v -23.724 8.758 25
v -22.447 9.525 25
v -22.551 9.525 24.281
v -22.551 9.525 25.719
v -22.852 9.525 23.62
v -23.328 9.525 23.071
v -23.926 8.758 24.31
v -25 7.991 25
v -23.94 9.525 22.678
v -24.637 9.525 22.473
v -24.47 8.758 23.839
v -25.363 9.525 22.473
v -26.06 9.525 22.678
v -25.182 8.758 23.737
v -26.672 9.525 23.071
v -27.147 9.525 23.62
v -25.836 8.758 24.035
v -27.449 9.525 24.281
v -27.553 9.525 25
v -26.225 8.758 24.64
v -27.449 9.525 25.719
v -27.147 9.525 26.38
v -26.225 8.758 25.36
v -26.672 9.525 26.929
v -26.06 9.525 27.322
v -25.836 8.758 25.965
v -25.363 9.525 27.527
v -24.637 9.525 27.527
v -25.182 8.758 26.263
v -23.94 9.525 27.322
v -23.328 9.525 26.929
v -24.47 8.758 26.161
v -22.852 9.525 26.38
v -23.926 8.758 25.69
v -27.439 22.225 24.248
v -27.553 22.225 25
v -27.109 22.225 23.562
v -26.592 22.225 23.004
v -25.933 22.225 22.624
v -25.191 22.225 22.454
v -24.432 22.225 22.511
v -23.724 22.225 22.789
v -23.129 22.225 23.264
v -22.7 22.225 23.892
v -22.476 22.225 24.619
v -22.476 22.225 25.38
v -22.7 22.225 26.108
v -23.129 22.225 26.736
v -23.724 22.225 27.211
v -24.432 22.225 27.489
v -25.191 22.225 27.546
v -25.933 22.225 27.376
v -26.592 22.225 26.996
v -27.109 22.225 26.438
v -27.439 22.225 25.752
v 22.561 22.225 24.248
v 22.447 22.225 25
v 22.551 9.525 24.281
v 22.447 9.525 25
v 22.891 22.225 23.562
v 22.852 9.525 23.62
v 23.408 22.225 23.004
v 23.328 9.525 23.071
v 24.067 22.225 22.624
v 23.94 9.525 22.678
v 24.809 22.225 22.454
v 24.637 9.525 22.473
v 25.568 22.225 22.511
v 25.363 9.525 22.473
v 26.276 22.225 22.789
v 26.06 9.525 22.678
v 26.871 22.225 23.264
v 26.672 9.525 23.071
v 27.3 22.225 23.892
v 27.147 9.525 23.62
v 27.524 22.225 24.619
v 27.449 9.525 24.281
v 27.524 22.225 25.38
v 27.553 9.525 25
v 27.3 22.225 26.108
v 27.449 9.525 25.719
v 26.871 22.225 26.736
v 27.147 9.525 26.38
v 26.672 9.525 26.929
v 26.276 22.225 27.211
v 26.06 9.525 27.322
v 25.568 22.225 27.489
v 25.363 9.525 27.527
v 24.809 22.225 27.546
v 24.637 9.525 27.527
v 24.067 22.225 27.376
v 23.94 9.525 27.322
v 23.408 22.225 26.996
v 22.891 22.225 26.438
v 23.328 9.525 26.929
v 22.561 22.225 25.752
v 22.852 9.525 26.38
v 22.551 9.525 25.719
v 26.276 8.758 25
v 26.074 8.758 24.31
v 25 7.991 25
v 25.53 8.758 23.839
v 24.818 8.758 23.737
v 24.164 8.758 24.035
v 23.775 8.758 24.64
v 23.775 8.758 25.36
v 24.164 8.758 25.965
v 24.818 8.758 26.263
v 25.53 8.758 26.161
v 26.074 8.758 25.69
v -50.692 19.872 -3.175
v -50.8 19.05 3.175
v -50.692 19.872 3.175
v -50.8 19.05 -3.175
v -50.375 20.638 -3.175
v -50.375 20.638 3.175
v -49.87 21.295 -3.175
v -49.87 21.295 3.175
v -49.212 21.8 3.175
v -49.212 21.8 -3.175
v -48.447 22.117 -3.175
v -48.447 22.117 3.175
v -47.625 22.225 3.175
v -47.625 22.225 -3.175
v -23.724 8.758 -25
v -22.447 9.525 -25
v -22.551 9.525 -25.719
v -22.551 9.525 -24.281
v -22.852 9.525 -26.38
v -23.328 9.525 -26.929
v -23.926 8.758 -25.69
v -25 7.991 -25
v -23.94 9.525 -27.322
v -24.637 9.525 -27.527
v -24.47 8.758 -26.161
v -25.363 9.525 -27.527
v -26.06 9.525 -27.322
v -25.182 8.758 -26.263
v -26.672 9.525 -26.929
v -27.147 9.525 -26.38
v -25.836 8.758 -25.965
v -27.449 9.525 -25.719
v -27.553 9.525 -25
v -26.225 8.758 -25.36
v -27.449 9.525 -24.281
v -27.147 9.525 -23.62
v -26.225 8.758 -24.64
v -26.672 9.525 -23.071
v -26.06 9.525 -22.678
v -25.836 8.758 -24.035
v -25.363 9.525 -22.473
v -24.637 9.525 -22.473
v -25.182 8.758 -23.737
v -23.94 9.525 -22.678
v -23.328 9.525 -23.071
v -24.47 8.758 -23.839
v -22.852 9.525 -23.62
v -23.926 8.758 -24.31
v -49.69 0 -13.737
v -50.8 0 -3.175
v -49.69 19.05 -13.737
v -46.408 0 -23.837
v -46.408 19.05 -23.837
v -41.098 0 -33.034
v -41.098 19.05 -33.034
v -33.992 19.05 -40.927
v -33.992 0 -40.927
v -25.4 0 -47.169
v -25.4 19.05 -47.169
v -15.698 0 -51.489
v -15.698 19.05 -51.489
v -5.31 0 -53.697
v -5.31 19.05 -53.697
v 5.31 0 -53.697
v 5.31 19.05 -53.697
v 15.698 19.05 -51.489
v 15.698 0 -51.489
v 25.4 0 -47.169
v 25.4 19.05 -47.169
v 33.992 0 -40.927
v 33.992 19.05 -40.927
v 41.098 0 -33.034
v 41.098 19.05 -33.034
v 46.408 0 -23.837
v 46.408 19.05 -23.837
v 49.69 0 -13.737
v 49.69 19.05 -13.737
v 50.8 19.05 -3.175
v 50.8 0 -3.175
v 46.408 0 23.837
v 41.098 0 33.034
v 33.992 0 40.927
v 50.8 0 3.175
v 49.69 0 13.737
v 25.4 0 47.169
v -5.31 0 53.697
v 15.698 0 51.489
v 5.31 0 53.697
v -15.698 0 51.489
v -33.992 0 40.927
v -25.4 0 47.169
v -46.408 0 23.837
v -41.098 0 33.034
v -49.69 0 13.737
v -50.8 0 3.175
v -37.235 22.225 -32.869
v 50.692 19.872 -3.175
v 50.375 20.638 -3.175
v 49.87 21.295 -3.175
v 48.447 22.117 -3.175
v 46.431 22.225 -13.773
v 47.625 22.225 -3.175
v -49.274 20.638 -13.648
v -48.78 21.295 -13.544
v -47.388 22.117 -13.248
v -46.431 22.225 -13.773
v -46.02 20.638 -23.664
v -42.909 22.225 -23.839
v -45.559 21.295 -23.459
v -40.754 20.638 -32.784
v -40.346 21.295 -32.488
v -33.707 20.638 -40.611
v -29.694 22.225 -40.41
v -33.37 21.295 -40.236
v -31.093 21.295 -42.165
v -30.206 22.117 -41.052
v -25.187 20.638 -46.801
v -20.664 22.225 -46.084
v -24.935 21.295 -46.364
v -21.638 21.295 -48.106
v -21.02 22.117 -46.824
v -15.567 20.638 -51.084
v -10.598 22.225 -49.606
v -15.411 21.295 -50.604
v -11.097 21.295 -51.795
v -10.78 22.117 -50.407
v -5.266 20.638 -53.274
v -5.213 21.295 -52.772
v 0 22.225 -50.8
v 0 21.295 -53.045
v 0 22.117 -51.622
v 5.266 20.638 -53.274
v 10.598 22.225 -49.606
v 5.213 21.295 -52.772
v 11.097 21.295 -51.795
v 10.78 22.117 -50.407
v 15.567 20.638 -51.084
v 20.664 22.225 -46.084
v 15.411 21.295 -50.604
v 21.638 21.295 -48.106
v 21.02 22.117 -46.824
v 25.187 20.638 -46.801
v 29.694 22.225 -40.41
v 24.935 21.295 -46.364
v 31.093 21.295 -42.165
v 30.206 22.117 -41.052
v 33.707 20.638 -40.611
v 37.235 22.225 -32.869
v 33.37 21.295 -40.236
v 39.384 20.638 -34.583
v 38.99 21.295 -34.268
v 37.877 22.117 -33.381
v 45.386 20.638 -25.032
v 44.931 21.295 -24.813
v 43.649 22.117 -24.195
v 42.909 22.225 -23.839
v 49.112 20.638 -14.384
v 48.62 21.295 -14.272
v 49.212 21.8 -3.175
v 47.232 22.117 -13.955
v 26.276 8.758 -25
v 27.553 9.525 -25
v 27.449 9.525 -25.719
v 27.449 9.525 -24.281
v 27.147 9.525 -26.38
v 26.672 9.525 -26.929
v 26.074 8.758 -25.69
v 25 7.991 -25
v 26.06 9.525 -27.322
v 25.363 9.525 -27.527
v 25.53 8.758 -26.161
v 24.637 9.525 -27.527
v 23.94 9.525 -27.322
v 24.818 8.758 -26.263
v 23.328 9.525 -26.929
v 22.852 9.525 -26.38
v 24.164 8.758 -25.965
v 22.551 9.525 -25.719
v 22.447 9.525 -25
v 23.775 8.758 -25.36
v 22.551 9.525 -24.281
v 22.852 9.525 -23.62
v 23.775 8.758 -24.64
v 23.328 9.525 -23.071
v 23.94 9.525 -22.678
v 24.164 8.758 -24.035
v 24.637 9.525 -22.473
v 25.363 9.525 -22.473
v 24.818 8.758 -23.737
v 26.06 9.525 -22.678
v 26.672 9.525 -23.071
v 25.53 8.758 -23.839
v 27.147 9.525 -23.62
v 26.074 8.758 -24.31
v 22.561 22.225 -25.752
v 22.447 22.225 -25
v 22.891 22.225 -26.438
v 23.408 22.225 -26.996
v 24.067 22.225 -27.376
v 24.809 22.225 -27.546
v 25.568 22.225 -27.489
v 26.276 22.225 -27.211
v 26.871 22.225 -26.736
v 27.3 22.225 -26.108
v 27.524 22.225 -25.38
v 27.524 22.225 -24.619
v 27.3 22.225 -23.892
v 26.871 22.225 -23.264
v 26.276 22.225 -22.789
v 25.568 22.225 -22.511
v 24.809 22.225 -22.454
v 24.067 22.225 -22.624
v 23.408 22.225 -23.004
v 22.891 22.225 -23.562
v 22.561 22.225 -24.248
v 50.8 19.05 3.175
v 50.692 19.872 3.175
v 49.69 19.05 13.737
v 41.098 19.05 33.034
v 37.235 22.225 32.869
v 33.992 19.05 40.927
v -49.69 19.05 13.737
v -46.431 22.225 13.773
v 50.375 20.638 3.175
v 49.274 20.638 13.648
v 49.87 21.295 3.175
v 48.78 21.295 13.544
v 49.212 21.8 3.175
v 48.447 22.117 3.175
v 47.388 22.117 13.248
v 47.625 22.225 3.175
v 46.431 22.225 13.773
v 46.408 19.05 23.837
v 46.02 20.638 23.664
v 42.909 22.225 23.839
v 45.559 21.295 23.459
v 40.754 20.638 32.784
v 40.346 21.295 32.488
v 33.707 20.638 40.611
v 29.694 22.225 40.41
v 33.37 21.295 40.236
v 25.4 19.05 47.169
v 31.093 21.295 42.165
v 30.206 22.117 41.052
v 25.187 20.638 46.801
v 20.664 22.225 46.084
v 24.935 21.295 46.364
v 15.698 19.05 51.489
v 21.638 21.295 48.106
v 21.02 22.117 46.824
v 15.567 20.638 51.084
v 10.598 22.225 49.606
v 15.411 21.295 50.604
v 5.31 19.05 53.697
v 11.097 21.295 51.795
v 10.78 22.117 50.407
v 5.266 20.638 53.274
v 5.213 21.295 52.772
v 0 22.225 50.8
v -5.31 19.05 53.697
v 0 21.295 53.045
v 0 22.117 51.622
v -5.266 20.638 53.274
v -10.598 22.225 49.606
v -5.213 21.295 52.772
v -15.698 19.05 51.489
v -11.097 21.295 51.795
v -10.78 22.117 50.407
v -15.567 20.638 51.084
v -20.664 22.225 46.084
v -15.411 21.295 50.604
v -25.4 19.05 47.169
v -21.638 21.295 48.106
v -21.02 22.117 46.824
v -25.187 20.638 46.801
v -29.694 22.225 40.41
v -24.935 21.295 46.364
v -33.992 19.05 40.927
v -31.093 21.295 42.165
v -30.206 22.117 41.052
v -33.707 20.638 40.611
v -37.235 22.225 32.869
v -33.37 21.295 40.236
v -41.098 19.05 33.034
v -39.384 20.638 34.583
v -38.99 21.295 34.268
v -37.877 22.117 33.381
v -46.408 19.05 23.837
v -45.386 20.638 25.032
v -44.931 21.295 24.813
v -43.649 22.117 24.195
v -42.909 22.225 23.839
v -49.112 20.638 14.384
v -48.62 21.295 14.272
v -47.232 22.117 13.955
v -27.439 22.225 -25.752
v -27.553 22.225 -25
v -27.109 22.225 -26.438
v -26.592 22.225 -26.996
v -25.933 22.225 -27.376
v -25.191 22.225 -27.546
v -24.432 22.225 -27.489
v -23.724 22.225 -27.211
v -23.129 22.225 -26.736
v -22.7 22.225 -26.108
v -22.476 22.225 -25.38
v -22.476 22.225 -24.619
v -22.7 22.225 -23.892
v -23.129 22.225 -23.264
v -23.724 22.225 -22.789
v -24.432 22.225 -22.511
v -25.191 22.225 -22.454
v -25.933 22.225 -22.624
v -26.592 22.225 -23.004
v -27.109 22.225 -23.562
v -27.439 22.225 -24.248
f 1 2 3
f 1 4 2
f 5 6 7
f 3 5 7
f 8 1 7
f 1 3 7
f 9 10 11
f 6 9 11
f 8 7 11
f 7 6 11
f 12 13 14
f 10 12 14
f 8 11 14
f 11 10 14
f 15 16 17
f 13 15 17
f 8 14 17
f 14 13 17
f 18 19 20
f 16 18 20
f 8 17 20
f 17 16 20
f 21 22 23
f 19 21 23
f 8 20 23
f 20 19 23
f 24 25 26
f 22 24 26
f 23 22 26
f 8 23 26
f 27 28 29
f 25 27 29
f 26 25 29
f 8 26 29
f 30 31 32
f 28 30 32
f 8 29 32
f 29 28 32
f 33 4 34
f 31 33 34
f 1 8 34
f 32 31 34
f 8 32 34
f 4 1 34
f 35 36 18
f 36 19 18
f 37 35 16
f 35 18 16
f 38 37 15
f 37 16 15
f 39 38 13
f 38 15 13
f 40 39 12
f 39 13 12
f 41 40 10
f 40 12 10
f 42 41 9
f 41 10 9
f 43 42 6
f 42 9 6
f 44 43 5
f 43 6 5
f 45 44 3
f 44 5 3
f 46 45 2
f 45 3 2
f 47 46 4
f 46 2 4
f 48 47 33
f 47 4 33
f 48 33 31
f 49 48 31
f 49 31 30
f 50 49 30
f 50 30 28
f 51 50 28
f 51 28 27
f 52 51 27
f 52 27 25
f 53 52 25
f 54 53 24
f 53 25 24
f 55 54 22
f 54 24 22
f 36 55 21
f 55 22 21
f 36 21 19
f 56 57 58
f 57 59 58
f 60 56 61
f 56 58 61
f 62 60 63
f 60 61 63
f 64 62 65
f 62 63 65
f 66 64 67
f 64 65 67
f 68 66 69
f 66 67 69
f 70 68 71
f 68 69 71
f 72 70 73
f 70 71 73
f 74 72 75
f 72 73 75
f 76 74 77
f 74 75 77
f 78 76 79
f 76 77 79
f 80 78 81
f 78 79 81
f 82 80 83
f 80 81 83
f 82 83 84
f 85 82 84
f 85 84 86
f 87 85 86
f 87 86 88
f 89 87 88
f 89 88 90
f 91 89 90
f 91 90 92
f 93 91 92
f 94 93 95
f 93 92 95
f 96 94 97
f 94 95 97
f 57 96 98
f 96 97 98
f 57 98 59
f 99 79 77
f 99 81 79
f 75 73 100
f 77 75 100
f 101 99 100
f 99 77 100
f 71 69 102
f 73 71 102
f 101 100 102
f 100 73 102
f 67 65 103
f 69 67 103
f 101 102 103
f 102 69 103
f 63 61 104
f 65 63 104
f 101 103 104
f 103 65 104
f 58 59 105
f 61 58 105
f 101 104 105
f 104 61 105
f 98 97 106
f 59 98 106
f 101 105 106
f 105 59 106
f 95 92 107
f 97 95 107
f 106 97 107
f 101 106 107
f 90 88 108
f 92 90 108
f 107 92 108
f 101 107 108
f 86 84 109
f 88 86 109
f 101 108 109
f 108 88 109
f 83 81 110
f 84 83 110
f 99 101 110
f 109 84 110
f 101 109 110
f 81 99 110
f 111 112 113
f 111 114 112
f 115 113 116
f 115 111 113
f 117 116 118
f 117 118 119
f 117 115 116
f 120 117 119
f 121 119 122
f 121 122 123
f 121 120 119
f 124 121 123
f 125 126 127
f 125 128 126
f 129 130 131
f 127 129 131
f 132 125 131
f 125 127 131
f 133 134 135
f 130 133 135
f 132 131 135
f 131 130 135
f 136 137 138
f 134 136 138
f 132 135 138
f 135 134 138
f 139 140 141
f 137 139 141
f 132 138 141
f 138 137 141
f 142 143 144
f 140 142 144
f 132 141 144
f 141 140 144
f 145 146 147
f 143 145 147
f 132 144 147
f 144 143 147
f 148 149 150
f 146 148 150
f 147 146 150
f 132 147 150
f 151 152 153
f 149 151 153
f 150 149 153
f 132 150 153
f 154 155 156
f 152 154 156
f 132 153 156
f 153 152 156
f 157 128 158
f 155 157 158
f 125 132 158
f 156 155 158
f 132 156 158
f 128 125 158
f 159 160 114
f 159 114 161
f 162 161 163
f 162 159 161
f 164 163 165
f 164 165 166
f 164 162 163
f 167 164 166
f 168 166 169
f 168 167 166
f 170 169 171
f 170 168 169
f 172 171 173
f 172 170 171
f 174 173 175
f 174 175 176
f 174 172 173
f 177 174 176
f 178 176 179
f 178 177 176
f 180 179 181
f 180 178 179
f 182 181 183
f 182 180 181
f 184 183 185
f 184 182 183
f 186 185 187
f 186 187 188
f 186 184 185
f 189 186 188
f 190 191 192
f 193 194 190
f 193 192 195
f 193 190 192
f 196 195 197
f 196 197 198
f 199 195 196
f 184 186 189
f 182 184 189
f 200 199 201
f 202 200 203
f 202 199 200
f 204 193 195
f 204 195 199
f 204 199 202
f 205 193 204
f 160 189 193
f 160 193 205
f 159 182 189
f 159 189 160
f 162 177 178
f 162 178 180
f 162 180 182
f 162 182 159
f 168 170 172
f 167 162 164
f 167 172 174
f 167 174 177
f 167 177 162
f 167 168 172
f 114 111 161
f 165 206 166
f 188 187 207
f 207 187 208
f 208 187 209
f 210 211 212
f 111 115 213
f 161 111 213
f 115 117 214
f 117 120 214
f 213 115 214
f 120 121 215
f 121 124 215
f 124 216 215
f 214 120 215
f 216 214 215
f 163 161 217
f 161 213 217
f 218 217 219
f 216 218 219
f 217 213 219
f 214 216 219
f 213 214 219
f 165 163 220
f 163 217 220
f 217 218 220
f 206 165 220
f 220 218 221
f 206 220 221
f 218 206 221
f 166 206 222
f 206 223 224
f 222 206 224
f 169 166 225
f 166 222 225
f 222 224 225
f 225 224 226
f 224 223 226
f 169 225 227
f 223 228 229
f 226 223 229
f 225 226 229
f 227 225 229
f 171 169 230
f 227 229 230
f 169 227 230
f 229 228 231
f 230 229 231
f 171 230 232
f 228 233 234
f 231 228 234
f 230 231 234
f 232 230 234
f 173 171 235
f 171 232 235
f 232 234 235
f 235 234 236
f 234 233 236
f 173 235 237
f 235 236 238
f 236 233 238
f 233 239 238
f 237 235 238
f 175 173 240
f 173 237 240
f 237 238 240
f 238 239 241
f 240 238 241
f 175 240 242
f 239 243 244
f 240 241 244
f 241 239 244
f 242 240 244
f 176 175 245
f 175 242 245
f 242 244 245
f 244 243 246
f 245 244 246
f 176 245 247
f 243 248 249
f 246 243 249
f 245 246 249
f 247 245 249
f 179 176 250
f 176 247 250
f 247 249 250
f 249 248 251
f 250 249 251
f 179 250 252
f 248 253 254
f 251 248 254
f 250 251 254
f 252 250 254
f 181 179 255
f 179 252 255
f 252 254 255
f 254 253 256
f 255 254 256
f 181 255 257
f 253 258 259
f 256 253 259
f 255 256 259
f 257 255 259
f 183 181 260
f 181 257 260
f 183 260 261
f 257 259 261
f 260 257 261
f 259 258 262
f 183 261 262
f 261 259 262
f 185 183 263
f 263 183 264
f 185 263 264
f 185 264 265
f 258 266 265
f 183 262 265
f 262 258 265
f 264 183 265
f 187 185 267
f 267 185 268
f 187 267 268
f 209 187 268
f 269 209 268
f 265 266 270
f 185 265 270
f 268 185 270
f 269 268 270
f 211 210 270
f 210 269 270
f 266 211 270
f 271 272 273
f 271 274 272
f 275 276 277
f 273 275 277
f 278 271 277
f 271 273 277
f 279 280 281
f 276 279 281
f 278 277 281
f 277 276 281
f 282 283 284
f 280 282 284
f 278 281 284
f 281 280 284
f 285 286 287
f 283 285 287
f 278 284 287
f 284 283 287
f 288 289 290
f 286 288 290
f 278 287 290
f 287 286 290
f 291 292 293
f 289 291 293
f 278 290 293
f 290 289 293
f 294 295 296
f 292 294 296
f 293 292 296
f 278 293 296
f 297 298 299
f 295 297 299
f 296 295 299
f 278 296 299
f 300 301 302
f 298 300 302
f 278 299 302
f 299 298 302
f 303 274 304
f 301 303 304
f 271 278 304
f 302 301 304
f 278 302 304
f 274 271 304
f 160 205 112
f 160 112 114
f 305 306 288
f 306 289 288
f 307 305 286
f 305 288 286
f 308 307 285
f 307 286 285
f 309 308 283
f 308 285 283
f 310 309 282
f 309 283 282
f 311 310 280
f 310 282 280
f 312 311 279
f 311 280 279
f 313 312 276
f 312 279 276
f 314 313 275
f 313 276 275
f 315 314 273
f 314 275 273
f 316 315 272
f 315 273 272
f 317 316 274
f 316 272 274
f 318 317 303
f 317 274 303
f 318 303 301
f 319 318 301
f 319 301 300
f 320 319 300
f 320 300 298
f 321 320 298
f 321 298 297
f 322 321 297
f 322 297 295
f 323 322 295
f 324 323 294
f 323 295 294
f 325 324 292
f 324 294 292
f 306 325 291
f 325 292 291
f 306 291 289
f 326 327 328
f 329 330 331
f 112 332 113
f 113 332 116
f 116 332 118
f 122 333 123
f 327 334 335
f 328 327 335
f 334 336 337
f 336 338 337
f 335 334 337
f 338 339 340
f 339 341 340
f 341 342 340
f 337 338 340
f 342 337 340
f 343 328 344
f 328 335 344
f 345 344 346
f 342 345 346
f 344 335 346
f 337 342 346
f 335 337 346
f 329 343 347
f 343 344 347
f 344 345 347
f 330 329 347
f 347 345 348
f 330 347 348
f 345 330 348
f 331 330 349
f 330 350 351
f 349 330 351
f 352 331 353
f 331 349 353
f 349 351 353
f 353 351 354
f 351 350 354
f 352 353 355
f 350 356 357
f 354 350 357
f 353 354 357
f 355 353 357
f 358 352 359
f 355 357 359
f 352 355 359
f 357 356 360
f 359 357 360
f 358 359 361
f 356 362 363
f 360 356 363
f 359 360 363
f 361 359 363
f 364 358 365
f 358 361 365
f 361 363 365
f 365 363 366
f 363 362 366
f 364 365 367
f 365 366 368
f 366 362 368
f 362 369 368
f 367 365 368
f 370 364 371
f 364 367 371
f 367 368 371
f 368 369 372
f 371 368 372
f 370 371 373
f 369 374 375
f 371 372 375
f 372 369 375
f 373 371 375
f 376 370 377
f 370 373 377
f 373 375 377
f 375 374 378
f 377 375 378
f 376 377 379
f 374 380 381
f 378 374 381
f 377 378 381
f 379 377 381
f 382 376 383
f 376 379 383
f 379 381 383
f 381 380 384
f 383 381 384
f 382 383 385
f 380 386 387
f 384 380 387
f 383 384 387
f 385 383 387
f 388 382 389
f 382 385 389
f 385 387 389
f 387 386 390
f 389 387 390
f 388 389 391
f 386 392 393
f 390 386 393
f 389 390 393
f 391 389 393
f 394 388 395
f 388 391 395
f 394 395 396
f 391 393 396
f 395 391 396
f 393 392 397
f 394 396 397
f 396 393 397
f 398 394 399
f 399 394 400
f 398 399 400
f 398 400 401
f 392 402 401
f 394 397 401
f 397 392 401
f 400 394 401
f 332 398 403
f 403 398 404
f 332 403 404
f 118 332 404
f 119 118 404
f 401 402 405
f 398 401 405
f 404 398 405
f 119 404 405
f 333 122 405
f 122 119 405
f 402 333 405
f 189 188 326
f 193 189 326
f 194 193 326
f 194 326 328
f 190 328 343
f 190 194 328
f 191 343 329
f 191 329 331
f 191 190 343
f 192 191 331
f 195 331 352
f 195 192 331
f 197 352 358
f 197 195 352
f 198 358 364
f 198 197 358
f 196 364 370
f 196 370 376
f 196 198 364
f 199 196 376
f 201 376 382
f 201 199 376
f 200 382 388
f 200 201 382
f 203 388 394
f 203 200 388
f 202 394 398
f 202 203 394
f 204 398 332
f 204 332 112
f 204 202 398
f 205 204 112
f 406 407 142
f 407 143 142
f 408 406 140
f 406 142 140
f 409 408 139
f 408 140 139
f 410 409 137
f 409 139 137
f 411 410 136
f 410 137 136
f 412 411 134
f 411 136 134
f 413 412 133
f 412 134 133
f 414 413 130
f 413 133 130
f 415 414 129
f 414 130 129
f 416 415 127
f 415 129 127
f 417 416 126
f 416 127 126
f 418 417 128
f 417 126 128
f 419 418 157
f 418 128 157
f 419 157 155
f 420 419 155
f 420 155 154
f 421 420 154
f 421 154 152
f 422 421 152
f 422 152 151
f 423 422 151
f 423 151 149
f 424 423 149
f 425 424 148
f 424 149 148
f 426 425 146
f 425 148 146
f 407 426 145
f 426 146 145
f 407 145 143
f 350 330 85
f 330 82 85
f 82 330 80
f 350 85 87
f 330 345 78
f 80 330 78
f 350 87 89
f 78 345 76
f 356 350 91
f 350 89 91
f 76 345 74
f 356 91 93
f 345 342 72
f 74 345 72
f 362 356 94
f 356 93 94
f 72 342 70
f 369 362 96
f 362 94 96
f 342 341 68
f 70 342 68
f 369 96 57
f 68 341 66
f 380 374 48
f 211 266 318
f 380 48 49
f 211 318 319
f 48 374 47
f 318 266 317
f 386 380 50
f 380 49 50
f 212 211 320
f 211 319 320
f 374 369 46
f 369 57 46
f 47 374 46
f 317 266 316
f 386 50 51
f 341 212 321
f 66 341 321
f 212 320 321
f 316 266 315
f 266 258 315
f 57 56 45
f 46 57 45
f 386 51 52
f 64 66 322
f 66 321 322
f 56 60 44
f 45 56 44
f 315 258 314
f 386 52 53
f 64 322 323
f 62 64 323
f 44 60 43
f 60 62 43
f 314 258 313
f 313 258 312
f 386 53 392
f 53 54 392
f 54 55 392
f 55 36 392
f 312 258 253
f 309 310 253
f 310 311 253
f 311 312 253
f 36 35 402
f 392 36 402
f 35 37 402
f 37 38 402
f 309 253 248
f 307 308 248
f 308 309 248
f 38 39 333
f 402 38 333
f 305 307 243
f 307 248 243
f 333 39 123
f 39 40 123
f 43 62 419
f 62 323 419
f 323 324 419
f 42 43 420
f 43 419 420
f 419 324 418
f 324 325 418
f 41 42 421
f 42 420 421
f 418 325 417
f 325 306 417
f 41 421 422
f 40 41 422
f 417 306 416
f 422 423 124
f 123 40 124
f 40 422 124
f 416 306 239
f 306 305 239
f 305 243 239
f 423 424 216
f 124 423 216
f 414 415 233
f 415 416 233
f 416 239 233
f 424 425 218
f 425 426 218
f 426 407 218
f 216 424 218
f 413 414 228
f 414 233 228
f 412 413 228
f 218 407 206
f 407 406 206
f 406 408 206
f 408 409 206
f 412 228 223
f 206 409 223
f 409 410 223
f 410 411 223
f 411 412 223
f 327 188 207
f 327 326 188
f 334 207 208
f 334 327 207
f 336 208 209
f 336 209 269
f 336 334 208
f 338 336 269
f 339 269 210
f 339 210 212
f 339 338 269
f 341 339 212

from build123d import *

# Parameters (mm, degrees)
BOSS_EXTRUDE1_DEPTH         = 22.225
F_1_4_20_TAPPED_HOLE1_D     = 5.1054
F_1_4_20_TAPPED_HOLE1_DEPTH = 12.7
F_1_4_20_TAPPED_HOLE1_TIP   = 1.533816902
FILLET1_R                   = 3.175


with BuildPart() as part:
    # Sketch1 → Boss-Extrude1 (new body)
    with BuildSketch(Plane(origin=(0, 0, 0), x_dir=(1, 0, 0), z_dir=(0, 1, 0))):
        with BuildLine():
            Line((50.8, 3.175), (50.8, -3.175))
            ThreePointArc((50.8, -3.175), (0, -53.975), (-50.8, -3.175))
            Line((-50.8, -3.175), (-50.8, 3.175))
            ThreePointArc((-50.8, 3.175), (0, 53.975), (50.8, 3.175))
        make_face()
    extrude(amount=BOSS_EXTRUDE1_DEPTH)

    # 1/4-20 Tapped Hole1
    with Locations(Plane(origin=(0, 22.225, 0), x_dir=(1, 0, 0), z_dir=(0, 1, 0))):
        with Locations((-24.99995, 24.99995), (24.99995, 24.99995), (24.99995, -24.99995), (-24.99995, -24.99995)):
            Hole(F_1_4_20_TAPPED_HOLE1_D / 2, depth=F_1_4_20_TAPPED_HOLE1_DEPTH)
            with Locations((0, 0, -(F_1_4_20_TAPPED_HOLE1_DEPTH + F_1_4_20_TAPPED_HOLE1_TIP / 2))):  # 118° drill point
                Cone(0, F_1_4_20_TAPPED_HOLE1_D / 2, F_1_4_20_TAPPED_HOLE1_TIP, mode=Mode.SUBTRACT)

    # Fillet1
    fillet1_edges = [part.edges().sort_by_distance(p)[0] for p in [
        (0, 22.225, 53.975),
        (50.8, 22.225, 0),
        (0, 22.225, -53.975),
        (-50.8, 22.225, 0),
    ]]
    fillet(fillet1_edges, radius=FILLET1_R)


solid = part.part
